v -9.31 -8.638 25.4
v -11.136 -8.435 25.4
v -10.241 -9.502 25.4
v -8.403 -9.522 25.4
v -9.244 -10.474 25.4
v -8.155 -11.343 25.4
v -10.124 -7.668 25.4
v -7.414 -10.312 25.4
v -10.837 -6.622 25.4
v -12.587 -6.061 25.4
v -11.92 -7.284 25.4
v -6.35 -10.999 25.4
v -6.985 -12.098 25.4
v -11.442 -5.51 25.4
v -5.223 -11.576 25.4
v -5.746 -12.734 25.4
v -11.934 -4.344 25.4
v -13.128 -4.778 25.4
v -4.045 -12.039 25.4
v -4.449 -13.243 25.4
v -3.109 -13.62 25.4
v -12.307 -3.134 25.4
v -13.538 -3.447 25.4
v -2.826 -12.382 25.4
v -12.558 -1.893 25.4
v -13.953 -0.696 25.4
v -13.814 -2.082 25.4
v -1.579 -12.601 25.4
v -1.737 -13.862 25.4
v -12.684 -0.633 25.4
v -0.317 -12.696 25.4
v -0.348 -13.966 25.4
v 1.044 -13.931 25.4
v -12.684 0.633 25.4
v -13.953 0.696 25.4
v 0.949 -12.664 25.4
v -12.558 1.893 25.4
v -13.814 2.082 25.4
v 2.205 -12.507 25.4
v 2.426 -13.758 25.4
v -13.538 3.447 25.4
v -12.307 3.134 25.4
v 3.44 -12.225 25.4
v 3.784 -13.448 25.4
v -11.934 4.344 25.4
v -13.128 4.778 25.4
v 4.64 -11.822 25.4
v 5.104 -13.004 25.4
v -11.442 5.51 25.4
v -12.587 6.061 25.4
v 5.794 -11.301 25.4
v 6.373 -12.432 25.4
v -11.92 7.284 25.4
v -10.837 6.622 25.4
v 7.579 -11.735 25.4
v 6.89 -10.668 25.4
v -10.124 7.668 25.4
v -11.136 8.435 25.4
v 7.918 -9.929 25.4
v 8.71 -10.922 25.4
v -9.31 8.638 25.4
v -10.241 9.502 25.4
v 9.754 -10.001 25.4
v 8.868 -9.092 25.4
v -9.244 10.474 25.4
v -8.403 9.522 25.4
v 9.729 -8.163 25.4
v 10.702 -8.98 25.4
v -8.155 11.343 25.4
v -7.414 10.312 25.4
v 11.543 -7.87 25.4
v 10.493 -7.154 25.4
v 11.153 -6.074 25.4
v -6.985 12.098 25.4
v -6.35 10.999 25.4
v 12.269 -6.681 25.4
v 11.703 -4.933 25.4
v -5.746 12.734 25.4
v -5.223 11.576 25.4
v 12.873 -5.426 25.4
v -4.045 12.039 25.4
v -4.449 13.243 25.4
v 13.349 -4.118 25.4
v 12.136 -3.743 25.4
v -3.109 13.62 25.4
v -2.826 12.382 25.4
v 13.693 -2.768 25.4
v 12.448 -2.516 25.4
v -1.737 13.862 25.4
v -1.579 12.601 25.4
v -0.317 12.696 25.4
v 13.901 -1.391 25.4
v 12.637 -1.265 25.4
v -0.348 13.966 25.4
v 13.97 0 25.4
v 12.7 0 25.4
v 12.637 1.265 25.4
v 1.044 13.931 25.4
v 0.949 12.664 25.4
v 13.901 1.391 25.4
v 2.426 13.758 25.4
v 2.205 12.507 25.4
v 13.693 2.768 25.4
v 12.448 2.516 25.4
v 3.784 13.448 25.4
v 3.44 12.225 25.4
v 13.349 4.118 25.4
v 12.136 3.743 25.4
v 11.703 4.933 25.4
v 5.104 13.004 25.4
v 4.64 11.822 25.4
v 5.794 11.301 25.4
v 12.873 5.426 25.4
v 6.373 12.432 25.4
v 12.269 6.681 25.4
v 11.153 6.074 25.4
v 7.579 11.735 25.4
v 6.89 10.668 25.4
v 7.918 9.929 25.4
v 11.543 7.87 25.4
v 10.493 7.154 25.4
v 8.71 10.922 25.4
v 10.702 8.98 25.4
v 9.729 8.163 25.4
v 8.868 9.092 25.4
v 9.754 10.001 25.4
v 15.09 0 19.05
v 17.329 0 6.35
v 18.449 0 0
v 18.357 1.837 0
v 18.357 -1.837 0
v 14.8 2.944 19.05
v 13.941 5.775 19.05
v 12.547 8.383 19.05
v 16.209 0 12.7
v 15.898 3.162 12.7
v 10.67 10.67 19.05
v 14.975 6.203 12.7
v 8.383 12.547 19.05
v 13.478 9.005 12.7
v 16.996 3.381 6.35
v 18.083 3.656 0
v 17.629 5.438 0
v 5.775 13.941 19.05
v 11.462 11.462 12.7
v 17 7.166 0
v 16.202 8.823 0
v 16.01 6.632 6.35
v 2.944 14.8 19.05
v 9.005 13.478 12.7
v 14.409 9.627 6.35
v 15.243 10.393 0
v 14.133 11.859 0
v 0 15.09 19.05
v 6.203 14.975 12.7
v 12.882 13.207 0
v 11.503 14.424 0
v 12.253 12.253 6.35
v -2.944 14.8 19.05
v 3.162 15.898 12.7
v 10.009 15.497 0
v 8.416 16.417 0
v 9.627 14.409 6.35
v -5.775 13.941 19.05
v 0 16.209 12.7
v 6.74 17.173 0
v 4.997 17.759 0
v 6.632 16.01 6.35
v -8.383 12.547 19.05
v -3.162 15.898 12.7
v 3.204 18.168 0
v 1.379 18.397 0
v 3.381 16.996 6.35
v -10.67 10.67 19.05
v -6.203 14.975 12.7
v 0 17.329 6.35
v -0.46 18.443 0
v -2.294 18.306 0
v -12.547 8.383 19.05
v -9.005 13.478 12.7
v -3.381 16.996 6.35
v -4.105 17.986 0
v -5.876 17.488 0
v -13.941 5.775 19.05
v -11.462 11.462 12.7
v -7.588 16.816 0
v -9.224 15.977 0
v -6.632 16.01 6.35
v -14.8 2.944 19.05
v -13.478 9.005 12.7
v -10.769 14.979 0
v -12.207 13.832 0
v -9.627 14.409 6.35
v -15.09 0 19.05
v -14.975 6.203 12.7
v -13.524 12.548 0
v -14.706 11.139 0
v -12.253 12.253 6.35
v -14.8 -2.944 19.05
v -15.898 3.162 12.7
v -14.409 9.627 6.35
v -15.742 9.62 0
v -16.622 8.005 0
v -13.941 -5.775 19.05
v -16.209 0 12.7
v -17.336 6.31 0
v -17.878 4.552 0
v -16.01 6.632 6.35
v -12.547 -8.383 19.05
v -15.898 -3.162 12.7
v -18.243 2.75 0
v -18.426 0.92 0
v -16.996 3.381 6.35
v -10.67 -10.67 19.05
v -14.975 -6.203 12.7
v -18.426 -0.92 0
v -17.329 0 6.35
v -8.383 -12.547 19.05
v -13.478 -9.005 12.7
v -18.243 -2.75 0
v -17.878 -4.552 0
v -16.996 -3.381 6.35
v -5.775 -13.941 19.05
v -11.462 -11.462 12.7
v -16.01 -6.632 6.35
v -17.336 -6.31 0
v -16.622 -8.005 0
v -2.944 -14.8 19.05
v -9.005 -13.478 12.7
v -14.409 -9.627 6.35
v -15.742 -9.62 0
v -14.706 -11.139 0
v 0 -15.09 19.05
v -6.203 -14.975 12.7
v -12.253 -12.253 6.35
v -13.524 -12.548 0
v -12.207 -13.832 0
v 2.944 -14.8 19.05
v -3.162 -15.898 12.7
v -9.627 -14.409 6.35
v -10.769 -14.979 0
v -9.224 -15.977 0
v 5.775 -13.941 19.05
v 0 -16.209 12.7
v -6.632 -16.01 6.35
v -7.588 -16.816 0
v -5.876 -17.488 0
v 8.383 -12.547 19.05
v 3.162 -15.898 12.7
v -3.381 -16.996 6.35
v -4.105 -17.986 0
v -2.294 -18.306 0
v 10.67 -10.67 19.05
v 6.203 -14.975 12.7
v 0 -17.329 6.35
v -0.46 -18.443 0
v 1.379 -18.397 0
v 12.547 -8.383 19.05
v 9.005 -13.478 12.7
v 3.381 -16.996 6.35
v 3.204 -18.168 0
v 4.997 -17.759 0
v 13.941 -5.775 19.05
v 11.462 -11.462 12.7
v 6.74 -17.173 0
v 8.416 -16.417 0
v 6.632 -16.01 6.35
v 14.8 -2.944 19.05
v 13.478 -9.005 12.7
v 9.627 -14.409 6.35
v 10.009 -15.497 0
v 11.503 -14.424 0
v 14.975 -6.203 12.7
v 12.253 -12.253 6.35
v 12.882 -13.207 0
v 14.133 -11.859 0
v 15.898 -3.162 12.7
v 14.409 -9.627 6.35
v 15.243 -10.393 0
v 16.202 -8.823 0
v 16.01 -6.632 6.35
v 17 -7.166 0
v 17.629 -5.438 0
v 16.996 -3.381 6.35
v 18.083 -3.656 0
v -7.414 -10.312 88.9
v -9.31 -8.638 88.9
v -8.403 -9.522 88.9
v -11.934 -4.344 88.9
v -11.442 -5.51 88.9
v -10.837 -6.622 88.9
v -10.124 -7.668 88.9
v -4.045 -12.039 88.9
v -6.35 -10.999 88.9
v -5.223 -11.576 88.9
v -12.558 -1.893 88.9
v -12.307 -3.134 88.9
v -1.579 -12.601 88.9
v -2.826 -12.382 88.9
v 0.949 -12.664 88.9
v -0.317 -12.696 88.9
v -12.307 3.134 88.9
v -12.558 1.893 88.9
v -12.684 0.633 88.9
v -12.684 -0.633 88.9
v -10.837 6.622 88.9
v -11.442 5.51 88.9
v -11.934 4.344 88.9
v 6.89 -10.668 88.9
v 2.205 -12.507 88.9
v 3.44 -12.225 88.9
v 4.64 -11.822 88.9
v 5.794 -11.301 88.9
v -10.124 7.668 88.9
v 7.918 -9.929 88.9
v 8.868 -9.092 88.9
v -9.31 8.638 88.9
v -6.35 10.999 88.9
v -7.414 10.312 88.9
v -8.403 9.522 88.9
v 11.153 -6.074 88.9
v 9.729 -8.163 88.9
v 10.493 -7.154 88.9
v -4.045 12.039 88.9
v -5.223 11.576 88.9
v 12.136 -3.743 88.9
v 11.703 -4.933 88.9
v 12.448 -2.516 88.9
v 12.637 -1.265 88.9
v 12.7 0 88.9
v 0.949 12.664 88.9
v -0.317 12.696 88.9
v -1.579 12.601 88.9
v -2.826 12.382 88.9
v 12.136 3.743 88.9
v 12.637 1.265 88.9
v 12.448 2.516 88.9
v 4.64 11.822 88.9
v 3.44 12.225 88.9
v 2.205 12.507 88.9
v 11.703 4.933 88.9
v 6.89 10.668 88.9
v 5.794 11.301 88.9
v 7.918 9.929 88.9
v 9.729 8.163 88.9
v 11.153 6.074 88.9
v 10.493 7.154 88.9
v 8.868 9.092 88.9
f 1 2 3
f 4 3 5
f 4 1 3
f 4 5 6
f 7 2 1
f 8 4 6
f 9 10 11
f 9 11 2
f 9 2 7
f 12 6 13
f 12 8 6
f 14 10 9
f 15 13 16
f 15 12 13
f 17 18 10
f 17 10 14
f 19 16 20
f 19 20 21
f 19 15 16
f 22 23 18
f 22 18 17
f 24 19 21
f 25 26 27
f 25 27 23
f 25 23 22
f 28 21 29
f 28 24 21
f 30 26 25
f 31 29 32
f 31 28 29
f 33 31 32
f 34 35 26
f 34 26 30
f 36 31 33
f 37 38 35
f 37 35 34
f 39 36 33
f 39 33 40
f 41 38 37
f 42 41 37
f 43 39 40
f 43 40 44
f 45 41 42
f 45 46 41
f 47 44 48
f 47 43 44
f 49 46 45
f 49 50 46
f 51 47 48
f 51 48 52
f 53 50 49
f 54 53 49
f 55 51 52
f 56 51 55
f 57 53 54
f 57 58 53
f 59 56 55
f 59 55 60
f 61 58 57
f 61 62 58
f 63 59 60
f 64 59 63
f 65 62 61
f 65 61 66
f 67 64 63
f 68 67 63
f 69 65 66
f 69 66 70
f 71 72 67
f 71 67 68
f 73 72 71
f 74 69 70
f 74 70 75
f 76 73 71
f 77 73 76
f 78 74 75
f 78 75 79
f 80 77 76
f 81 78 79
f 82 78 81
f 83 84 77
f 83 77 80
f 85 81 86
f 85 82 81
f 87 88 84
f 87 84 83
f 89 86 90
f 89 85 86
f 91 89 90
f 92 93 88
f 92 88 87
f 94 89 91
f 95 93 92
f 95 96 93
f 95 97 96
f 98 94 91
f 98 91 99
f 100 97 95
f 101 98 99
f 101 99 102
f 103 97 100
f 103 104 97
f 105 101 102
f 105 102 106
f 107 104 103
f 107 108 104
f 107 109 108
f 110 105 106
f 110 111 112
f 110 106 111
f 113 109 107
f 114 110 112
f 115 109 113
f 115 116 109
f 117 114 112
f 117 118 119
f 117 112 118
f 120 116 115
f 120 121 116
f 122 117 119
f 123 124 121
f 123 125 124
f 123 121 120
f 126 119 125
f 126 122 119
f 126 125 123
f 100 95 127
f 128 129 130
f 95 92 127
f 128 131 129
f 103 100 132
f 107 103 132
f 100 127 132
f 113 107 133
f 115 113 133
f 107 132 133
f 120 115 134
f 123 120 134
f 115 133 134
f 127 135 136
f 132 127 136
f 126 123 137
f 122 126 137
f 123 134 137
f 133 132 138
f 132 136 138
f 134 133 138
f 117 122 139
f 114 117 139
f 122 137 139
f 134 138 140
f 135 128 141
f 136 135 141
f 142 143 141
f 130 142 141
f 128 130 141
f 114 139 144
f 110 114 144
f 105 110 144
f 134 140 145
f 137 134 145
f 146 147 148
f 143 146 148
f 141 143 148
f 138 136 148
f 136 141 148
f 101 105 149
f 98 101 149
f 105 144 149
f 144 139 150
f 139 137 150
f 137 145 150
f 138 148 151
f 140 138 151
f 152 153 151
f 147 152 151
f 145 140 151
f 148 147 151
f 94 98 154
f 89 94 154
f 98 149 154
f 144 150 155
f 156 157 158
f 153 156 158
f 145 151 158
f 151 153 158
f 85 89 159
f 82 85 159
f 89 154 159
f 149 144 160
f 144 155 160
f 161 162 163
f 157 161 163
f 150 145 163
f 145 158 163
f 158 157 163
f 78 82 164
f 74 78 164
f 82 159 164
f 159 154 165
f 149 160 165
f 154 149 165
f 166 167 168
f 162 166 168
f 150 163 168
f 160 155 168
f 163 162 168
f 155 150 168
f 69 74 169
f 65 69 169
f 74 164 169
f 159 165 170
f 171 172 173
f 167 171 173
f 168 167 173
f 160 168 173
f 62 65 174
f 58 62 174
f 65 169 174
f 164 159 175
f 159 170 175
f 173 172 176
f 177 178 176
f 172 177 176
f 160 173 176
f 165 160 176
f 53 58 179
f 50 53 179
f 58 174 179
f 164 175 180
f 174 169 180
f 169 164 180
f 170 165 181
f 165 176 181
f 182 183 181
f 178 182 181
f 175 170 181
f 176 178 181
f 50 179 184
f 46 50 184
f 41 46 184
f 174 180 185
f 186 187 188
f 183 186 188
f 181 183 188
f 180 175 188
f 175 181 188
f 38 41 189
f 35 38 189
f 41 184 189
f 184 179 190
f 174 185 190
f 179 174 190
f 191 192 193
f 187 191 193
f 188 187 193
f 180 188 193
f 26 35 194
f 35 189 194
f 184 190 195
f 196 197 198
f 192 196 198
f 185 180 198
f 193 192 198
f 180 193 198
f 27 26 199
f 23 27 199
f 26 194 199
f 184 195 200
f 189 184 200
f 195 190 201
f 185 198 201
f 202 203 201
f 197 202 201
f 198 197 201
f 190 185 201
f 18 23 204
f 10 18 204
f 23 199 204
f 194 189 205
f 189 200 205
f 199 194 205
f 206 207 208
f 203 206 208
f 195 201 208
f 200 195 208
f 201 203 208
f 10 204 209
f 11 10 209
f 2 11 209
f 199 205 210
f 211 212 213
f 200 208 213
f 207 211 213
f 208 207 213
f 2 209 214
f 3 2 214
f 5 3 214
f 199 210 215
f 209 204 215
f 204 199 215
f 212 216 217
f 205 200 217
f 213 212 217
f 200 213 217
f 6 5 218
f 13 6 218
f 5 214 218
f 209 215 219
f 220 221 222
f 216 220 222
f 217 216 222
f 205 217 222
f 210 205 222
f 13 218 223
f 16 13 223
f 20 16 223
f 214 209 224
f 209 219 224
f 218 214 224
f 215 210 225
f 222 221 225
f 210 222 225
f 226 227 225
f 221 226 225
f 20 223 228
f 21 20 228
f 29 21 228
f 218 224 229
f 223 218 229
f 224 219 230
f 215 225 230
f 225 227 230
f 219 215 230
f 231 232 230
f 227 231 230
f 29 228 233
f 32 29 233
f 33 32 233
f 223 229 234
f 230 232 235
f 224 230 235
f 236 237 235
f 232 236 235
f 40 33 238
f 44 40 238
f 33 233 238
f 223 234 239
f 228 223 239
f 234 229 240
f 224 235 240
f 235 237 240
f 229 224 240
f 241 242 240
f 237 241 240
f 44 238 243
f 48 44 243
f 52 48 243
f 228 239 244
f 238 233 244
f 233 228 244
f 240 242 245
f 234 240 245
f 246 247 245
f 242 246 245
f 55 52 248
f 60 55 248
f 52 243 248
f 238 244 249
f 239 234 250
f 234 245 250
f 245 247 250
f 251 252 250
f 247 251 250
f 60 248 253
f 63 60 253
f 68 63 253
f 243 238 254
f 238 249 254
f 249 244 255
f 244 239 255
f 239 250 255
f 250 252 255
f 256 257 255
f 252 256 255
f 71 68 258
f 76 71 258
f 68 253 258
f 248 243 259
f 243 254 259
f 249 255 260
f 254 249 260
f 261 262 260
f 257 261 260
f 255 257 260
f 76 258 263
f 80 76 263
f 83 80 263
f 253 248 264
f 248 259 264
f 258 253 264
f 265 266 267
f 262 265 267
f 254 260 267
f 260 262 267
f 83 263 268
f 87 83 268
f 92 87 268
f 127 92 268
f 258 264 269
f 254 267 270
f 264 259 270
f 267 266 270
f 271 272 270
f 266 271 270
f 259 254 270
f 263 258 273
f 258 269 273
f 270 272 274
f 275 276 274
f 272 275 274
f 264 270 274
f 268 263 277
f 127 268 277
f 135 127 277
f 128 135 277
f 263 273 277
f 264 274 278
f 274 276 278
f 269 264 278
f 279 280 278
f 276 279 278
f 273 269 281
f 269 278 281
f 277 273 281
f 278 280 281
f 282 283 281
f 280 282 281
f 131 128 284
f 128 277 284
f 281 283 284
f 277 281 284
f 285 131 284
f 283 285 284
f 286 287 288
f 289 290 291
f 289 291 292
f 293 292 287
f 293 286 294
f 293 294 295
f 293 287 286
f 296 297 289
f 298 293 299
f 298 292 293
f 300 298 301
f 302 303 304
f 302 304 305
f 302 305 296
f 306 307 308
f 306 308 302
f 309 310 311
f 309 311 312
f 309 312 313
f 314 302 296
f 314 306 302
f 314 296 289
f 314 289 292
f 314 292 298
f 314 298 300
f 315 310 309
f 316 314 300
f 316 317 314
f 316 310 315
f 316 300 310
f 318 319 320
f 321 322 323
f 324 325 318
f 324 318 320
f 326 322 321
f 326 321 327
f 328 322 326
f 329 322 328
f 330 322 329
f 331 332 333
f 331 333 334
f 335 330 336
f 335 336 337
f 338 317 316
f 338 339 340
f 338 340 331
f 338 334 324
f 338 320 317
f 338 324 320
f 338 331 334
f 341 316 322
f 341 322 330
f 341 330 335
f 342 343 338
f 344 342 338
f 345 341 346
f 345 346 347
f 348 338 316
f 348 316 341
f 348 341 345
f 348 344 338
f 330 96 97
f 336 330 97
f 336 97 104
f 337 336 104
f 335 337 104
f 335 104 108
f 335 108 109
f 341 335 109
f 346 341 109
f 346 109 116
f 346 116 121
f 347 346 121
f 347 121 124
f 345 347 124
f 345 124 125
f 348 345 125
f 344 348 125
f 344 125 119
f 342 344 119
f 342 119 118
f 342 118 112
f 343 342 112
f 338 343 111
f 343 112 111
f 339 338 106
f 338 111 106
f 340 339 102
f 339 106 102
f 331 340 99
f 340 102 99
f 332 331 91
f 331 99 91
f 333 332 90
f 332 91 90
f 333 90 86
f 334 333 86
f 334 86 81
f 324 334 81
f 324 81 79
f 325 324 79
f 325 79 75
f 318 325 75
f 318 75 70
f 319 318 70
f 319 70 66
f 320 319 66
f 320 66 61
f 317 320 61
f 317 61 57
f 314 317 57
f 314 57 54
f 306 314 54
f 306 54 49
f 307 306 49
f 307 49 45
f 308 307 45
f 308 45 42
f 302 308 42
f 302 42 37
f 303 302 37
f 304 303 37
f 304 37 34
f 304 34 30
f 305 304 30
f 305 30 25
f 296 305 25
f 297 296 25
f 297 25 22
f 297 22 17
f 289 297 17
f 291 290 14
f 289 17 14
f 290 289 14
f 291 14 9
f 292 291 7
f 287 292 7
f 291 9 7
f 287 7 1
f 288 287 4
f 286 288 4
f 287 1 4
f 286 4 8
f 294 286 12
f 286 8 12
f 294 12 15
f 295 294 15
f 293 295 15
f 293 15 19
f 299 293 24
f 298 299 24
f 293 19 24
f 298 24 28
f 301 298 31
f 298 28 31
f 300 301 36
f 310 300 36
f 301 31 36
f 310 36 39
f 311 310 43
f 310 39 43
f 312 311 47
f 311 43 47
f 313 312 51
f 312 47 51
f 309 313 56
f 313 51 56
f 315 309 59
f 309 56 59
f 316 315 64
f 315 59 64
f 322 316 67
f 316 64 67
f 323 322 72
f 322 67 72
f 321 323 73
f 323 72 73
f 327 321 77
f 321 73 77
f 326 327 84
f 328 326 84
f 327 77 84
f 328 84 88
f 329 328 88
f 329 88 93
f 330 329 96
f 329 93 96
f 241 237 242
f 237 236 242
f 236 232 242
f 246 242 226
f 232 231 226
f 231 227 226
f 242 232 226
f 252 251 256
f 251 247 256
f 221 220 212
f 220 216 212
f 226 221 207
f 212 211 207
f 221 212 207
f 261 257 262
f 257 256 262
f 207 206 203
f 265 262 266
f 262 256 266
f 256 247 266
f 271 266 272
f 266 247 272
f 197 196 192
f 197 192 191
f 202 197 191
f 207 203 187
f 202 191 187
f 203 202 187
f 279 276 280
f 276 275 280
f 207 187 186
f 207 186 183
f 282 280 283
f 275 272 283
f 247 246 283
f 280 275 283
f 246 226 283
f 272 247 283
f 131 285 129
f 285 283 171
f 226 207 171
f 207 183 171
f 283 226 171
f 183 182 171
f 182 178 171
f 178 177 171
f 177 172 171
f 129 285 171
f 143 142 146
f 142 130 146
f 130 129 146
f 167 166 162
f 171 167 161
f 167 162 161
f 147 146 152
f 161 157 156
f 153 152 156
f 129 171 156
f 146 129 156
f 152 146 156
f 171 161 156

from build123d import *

# Parameters (mm, degrees)
F0_R     = 12.7
F1_DEPTH = 88.9
F0_R_2   = 19.05
F2_DEPTH = 25.4


# Not quite as in the source:
# - a fillet or chamfer that OpenCascade refuses, or shapes differently, is made with other operations: its cross-section is extruded or revolved along the edge and cut away or added


with BuildPart() as f1:
    # F0 (on Top) → F1 (new body)
    with BuildSketch(Plane.XY):
        Circle(F0_R)
    extrude(amount=F1_DEPTH)

    # F0 (on Top) → F2 (join)
    with BuildSketch(Plane.XY):
        Circle(F0_R_2)
        Circle(F0_R, mode=Mode.SUBTRACT)
    extrude(amount=F2_DEPTH)

    # F3: chamfer of 5.08 x 28.8101116437 on 1 edges, made by hand

    # F3_s1 → F3_t2 (revolve, cut)
    with BuildSketch(Plane.XZ):
        Polygon((13.97, 25.4), (19.05, -3.4101116437), (19.05, 25.4), align=None)
    revolve(axis=Axis((0, 0, 25.4), (0, 0, 1)), mode=Mode.SUBTRACT)


solid = f1.part
